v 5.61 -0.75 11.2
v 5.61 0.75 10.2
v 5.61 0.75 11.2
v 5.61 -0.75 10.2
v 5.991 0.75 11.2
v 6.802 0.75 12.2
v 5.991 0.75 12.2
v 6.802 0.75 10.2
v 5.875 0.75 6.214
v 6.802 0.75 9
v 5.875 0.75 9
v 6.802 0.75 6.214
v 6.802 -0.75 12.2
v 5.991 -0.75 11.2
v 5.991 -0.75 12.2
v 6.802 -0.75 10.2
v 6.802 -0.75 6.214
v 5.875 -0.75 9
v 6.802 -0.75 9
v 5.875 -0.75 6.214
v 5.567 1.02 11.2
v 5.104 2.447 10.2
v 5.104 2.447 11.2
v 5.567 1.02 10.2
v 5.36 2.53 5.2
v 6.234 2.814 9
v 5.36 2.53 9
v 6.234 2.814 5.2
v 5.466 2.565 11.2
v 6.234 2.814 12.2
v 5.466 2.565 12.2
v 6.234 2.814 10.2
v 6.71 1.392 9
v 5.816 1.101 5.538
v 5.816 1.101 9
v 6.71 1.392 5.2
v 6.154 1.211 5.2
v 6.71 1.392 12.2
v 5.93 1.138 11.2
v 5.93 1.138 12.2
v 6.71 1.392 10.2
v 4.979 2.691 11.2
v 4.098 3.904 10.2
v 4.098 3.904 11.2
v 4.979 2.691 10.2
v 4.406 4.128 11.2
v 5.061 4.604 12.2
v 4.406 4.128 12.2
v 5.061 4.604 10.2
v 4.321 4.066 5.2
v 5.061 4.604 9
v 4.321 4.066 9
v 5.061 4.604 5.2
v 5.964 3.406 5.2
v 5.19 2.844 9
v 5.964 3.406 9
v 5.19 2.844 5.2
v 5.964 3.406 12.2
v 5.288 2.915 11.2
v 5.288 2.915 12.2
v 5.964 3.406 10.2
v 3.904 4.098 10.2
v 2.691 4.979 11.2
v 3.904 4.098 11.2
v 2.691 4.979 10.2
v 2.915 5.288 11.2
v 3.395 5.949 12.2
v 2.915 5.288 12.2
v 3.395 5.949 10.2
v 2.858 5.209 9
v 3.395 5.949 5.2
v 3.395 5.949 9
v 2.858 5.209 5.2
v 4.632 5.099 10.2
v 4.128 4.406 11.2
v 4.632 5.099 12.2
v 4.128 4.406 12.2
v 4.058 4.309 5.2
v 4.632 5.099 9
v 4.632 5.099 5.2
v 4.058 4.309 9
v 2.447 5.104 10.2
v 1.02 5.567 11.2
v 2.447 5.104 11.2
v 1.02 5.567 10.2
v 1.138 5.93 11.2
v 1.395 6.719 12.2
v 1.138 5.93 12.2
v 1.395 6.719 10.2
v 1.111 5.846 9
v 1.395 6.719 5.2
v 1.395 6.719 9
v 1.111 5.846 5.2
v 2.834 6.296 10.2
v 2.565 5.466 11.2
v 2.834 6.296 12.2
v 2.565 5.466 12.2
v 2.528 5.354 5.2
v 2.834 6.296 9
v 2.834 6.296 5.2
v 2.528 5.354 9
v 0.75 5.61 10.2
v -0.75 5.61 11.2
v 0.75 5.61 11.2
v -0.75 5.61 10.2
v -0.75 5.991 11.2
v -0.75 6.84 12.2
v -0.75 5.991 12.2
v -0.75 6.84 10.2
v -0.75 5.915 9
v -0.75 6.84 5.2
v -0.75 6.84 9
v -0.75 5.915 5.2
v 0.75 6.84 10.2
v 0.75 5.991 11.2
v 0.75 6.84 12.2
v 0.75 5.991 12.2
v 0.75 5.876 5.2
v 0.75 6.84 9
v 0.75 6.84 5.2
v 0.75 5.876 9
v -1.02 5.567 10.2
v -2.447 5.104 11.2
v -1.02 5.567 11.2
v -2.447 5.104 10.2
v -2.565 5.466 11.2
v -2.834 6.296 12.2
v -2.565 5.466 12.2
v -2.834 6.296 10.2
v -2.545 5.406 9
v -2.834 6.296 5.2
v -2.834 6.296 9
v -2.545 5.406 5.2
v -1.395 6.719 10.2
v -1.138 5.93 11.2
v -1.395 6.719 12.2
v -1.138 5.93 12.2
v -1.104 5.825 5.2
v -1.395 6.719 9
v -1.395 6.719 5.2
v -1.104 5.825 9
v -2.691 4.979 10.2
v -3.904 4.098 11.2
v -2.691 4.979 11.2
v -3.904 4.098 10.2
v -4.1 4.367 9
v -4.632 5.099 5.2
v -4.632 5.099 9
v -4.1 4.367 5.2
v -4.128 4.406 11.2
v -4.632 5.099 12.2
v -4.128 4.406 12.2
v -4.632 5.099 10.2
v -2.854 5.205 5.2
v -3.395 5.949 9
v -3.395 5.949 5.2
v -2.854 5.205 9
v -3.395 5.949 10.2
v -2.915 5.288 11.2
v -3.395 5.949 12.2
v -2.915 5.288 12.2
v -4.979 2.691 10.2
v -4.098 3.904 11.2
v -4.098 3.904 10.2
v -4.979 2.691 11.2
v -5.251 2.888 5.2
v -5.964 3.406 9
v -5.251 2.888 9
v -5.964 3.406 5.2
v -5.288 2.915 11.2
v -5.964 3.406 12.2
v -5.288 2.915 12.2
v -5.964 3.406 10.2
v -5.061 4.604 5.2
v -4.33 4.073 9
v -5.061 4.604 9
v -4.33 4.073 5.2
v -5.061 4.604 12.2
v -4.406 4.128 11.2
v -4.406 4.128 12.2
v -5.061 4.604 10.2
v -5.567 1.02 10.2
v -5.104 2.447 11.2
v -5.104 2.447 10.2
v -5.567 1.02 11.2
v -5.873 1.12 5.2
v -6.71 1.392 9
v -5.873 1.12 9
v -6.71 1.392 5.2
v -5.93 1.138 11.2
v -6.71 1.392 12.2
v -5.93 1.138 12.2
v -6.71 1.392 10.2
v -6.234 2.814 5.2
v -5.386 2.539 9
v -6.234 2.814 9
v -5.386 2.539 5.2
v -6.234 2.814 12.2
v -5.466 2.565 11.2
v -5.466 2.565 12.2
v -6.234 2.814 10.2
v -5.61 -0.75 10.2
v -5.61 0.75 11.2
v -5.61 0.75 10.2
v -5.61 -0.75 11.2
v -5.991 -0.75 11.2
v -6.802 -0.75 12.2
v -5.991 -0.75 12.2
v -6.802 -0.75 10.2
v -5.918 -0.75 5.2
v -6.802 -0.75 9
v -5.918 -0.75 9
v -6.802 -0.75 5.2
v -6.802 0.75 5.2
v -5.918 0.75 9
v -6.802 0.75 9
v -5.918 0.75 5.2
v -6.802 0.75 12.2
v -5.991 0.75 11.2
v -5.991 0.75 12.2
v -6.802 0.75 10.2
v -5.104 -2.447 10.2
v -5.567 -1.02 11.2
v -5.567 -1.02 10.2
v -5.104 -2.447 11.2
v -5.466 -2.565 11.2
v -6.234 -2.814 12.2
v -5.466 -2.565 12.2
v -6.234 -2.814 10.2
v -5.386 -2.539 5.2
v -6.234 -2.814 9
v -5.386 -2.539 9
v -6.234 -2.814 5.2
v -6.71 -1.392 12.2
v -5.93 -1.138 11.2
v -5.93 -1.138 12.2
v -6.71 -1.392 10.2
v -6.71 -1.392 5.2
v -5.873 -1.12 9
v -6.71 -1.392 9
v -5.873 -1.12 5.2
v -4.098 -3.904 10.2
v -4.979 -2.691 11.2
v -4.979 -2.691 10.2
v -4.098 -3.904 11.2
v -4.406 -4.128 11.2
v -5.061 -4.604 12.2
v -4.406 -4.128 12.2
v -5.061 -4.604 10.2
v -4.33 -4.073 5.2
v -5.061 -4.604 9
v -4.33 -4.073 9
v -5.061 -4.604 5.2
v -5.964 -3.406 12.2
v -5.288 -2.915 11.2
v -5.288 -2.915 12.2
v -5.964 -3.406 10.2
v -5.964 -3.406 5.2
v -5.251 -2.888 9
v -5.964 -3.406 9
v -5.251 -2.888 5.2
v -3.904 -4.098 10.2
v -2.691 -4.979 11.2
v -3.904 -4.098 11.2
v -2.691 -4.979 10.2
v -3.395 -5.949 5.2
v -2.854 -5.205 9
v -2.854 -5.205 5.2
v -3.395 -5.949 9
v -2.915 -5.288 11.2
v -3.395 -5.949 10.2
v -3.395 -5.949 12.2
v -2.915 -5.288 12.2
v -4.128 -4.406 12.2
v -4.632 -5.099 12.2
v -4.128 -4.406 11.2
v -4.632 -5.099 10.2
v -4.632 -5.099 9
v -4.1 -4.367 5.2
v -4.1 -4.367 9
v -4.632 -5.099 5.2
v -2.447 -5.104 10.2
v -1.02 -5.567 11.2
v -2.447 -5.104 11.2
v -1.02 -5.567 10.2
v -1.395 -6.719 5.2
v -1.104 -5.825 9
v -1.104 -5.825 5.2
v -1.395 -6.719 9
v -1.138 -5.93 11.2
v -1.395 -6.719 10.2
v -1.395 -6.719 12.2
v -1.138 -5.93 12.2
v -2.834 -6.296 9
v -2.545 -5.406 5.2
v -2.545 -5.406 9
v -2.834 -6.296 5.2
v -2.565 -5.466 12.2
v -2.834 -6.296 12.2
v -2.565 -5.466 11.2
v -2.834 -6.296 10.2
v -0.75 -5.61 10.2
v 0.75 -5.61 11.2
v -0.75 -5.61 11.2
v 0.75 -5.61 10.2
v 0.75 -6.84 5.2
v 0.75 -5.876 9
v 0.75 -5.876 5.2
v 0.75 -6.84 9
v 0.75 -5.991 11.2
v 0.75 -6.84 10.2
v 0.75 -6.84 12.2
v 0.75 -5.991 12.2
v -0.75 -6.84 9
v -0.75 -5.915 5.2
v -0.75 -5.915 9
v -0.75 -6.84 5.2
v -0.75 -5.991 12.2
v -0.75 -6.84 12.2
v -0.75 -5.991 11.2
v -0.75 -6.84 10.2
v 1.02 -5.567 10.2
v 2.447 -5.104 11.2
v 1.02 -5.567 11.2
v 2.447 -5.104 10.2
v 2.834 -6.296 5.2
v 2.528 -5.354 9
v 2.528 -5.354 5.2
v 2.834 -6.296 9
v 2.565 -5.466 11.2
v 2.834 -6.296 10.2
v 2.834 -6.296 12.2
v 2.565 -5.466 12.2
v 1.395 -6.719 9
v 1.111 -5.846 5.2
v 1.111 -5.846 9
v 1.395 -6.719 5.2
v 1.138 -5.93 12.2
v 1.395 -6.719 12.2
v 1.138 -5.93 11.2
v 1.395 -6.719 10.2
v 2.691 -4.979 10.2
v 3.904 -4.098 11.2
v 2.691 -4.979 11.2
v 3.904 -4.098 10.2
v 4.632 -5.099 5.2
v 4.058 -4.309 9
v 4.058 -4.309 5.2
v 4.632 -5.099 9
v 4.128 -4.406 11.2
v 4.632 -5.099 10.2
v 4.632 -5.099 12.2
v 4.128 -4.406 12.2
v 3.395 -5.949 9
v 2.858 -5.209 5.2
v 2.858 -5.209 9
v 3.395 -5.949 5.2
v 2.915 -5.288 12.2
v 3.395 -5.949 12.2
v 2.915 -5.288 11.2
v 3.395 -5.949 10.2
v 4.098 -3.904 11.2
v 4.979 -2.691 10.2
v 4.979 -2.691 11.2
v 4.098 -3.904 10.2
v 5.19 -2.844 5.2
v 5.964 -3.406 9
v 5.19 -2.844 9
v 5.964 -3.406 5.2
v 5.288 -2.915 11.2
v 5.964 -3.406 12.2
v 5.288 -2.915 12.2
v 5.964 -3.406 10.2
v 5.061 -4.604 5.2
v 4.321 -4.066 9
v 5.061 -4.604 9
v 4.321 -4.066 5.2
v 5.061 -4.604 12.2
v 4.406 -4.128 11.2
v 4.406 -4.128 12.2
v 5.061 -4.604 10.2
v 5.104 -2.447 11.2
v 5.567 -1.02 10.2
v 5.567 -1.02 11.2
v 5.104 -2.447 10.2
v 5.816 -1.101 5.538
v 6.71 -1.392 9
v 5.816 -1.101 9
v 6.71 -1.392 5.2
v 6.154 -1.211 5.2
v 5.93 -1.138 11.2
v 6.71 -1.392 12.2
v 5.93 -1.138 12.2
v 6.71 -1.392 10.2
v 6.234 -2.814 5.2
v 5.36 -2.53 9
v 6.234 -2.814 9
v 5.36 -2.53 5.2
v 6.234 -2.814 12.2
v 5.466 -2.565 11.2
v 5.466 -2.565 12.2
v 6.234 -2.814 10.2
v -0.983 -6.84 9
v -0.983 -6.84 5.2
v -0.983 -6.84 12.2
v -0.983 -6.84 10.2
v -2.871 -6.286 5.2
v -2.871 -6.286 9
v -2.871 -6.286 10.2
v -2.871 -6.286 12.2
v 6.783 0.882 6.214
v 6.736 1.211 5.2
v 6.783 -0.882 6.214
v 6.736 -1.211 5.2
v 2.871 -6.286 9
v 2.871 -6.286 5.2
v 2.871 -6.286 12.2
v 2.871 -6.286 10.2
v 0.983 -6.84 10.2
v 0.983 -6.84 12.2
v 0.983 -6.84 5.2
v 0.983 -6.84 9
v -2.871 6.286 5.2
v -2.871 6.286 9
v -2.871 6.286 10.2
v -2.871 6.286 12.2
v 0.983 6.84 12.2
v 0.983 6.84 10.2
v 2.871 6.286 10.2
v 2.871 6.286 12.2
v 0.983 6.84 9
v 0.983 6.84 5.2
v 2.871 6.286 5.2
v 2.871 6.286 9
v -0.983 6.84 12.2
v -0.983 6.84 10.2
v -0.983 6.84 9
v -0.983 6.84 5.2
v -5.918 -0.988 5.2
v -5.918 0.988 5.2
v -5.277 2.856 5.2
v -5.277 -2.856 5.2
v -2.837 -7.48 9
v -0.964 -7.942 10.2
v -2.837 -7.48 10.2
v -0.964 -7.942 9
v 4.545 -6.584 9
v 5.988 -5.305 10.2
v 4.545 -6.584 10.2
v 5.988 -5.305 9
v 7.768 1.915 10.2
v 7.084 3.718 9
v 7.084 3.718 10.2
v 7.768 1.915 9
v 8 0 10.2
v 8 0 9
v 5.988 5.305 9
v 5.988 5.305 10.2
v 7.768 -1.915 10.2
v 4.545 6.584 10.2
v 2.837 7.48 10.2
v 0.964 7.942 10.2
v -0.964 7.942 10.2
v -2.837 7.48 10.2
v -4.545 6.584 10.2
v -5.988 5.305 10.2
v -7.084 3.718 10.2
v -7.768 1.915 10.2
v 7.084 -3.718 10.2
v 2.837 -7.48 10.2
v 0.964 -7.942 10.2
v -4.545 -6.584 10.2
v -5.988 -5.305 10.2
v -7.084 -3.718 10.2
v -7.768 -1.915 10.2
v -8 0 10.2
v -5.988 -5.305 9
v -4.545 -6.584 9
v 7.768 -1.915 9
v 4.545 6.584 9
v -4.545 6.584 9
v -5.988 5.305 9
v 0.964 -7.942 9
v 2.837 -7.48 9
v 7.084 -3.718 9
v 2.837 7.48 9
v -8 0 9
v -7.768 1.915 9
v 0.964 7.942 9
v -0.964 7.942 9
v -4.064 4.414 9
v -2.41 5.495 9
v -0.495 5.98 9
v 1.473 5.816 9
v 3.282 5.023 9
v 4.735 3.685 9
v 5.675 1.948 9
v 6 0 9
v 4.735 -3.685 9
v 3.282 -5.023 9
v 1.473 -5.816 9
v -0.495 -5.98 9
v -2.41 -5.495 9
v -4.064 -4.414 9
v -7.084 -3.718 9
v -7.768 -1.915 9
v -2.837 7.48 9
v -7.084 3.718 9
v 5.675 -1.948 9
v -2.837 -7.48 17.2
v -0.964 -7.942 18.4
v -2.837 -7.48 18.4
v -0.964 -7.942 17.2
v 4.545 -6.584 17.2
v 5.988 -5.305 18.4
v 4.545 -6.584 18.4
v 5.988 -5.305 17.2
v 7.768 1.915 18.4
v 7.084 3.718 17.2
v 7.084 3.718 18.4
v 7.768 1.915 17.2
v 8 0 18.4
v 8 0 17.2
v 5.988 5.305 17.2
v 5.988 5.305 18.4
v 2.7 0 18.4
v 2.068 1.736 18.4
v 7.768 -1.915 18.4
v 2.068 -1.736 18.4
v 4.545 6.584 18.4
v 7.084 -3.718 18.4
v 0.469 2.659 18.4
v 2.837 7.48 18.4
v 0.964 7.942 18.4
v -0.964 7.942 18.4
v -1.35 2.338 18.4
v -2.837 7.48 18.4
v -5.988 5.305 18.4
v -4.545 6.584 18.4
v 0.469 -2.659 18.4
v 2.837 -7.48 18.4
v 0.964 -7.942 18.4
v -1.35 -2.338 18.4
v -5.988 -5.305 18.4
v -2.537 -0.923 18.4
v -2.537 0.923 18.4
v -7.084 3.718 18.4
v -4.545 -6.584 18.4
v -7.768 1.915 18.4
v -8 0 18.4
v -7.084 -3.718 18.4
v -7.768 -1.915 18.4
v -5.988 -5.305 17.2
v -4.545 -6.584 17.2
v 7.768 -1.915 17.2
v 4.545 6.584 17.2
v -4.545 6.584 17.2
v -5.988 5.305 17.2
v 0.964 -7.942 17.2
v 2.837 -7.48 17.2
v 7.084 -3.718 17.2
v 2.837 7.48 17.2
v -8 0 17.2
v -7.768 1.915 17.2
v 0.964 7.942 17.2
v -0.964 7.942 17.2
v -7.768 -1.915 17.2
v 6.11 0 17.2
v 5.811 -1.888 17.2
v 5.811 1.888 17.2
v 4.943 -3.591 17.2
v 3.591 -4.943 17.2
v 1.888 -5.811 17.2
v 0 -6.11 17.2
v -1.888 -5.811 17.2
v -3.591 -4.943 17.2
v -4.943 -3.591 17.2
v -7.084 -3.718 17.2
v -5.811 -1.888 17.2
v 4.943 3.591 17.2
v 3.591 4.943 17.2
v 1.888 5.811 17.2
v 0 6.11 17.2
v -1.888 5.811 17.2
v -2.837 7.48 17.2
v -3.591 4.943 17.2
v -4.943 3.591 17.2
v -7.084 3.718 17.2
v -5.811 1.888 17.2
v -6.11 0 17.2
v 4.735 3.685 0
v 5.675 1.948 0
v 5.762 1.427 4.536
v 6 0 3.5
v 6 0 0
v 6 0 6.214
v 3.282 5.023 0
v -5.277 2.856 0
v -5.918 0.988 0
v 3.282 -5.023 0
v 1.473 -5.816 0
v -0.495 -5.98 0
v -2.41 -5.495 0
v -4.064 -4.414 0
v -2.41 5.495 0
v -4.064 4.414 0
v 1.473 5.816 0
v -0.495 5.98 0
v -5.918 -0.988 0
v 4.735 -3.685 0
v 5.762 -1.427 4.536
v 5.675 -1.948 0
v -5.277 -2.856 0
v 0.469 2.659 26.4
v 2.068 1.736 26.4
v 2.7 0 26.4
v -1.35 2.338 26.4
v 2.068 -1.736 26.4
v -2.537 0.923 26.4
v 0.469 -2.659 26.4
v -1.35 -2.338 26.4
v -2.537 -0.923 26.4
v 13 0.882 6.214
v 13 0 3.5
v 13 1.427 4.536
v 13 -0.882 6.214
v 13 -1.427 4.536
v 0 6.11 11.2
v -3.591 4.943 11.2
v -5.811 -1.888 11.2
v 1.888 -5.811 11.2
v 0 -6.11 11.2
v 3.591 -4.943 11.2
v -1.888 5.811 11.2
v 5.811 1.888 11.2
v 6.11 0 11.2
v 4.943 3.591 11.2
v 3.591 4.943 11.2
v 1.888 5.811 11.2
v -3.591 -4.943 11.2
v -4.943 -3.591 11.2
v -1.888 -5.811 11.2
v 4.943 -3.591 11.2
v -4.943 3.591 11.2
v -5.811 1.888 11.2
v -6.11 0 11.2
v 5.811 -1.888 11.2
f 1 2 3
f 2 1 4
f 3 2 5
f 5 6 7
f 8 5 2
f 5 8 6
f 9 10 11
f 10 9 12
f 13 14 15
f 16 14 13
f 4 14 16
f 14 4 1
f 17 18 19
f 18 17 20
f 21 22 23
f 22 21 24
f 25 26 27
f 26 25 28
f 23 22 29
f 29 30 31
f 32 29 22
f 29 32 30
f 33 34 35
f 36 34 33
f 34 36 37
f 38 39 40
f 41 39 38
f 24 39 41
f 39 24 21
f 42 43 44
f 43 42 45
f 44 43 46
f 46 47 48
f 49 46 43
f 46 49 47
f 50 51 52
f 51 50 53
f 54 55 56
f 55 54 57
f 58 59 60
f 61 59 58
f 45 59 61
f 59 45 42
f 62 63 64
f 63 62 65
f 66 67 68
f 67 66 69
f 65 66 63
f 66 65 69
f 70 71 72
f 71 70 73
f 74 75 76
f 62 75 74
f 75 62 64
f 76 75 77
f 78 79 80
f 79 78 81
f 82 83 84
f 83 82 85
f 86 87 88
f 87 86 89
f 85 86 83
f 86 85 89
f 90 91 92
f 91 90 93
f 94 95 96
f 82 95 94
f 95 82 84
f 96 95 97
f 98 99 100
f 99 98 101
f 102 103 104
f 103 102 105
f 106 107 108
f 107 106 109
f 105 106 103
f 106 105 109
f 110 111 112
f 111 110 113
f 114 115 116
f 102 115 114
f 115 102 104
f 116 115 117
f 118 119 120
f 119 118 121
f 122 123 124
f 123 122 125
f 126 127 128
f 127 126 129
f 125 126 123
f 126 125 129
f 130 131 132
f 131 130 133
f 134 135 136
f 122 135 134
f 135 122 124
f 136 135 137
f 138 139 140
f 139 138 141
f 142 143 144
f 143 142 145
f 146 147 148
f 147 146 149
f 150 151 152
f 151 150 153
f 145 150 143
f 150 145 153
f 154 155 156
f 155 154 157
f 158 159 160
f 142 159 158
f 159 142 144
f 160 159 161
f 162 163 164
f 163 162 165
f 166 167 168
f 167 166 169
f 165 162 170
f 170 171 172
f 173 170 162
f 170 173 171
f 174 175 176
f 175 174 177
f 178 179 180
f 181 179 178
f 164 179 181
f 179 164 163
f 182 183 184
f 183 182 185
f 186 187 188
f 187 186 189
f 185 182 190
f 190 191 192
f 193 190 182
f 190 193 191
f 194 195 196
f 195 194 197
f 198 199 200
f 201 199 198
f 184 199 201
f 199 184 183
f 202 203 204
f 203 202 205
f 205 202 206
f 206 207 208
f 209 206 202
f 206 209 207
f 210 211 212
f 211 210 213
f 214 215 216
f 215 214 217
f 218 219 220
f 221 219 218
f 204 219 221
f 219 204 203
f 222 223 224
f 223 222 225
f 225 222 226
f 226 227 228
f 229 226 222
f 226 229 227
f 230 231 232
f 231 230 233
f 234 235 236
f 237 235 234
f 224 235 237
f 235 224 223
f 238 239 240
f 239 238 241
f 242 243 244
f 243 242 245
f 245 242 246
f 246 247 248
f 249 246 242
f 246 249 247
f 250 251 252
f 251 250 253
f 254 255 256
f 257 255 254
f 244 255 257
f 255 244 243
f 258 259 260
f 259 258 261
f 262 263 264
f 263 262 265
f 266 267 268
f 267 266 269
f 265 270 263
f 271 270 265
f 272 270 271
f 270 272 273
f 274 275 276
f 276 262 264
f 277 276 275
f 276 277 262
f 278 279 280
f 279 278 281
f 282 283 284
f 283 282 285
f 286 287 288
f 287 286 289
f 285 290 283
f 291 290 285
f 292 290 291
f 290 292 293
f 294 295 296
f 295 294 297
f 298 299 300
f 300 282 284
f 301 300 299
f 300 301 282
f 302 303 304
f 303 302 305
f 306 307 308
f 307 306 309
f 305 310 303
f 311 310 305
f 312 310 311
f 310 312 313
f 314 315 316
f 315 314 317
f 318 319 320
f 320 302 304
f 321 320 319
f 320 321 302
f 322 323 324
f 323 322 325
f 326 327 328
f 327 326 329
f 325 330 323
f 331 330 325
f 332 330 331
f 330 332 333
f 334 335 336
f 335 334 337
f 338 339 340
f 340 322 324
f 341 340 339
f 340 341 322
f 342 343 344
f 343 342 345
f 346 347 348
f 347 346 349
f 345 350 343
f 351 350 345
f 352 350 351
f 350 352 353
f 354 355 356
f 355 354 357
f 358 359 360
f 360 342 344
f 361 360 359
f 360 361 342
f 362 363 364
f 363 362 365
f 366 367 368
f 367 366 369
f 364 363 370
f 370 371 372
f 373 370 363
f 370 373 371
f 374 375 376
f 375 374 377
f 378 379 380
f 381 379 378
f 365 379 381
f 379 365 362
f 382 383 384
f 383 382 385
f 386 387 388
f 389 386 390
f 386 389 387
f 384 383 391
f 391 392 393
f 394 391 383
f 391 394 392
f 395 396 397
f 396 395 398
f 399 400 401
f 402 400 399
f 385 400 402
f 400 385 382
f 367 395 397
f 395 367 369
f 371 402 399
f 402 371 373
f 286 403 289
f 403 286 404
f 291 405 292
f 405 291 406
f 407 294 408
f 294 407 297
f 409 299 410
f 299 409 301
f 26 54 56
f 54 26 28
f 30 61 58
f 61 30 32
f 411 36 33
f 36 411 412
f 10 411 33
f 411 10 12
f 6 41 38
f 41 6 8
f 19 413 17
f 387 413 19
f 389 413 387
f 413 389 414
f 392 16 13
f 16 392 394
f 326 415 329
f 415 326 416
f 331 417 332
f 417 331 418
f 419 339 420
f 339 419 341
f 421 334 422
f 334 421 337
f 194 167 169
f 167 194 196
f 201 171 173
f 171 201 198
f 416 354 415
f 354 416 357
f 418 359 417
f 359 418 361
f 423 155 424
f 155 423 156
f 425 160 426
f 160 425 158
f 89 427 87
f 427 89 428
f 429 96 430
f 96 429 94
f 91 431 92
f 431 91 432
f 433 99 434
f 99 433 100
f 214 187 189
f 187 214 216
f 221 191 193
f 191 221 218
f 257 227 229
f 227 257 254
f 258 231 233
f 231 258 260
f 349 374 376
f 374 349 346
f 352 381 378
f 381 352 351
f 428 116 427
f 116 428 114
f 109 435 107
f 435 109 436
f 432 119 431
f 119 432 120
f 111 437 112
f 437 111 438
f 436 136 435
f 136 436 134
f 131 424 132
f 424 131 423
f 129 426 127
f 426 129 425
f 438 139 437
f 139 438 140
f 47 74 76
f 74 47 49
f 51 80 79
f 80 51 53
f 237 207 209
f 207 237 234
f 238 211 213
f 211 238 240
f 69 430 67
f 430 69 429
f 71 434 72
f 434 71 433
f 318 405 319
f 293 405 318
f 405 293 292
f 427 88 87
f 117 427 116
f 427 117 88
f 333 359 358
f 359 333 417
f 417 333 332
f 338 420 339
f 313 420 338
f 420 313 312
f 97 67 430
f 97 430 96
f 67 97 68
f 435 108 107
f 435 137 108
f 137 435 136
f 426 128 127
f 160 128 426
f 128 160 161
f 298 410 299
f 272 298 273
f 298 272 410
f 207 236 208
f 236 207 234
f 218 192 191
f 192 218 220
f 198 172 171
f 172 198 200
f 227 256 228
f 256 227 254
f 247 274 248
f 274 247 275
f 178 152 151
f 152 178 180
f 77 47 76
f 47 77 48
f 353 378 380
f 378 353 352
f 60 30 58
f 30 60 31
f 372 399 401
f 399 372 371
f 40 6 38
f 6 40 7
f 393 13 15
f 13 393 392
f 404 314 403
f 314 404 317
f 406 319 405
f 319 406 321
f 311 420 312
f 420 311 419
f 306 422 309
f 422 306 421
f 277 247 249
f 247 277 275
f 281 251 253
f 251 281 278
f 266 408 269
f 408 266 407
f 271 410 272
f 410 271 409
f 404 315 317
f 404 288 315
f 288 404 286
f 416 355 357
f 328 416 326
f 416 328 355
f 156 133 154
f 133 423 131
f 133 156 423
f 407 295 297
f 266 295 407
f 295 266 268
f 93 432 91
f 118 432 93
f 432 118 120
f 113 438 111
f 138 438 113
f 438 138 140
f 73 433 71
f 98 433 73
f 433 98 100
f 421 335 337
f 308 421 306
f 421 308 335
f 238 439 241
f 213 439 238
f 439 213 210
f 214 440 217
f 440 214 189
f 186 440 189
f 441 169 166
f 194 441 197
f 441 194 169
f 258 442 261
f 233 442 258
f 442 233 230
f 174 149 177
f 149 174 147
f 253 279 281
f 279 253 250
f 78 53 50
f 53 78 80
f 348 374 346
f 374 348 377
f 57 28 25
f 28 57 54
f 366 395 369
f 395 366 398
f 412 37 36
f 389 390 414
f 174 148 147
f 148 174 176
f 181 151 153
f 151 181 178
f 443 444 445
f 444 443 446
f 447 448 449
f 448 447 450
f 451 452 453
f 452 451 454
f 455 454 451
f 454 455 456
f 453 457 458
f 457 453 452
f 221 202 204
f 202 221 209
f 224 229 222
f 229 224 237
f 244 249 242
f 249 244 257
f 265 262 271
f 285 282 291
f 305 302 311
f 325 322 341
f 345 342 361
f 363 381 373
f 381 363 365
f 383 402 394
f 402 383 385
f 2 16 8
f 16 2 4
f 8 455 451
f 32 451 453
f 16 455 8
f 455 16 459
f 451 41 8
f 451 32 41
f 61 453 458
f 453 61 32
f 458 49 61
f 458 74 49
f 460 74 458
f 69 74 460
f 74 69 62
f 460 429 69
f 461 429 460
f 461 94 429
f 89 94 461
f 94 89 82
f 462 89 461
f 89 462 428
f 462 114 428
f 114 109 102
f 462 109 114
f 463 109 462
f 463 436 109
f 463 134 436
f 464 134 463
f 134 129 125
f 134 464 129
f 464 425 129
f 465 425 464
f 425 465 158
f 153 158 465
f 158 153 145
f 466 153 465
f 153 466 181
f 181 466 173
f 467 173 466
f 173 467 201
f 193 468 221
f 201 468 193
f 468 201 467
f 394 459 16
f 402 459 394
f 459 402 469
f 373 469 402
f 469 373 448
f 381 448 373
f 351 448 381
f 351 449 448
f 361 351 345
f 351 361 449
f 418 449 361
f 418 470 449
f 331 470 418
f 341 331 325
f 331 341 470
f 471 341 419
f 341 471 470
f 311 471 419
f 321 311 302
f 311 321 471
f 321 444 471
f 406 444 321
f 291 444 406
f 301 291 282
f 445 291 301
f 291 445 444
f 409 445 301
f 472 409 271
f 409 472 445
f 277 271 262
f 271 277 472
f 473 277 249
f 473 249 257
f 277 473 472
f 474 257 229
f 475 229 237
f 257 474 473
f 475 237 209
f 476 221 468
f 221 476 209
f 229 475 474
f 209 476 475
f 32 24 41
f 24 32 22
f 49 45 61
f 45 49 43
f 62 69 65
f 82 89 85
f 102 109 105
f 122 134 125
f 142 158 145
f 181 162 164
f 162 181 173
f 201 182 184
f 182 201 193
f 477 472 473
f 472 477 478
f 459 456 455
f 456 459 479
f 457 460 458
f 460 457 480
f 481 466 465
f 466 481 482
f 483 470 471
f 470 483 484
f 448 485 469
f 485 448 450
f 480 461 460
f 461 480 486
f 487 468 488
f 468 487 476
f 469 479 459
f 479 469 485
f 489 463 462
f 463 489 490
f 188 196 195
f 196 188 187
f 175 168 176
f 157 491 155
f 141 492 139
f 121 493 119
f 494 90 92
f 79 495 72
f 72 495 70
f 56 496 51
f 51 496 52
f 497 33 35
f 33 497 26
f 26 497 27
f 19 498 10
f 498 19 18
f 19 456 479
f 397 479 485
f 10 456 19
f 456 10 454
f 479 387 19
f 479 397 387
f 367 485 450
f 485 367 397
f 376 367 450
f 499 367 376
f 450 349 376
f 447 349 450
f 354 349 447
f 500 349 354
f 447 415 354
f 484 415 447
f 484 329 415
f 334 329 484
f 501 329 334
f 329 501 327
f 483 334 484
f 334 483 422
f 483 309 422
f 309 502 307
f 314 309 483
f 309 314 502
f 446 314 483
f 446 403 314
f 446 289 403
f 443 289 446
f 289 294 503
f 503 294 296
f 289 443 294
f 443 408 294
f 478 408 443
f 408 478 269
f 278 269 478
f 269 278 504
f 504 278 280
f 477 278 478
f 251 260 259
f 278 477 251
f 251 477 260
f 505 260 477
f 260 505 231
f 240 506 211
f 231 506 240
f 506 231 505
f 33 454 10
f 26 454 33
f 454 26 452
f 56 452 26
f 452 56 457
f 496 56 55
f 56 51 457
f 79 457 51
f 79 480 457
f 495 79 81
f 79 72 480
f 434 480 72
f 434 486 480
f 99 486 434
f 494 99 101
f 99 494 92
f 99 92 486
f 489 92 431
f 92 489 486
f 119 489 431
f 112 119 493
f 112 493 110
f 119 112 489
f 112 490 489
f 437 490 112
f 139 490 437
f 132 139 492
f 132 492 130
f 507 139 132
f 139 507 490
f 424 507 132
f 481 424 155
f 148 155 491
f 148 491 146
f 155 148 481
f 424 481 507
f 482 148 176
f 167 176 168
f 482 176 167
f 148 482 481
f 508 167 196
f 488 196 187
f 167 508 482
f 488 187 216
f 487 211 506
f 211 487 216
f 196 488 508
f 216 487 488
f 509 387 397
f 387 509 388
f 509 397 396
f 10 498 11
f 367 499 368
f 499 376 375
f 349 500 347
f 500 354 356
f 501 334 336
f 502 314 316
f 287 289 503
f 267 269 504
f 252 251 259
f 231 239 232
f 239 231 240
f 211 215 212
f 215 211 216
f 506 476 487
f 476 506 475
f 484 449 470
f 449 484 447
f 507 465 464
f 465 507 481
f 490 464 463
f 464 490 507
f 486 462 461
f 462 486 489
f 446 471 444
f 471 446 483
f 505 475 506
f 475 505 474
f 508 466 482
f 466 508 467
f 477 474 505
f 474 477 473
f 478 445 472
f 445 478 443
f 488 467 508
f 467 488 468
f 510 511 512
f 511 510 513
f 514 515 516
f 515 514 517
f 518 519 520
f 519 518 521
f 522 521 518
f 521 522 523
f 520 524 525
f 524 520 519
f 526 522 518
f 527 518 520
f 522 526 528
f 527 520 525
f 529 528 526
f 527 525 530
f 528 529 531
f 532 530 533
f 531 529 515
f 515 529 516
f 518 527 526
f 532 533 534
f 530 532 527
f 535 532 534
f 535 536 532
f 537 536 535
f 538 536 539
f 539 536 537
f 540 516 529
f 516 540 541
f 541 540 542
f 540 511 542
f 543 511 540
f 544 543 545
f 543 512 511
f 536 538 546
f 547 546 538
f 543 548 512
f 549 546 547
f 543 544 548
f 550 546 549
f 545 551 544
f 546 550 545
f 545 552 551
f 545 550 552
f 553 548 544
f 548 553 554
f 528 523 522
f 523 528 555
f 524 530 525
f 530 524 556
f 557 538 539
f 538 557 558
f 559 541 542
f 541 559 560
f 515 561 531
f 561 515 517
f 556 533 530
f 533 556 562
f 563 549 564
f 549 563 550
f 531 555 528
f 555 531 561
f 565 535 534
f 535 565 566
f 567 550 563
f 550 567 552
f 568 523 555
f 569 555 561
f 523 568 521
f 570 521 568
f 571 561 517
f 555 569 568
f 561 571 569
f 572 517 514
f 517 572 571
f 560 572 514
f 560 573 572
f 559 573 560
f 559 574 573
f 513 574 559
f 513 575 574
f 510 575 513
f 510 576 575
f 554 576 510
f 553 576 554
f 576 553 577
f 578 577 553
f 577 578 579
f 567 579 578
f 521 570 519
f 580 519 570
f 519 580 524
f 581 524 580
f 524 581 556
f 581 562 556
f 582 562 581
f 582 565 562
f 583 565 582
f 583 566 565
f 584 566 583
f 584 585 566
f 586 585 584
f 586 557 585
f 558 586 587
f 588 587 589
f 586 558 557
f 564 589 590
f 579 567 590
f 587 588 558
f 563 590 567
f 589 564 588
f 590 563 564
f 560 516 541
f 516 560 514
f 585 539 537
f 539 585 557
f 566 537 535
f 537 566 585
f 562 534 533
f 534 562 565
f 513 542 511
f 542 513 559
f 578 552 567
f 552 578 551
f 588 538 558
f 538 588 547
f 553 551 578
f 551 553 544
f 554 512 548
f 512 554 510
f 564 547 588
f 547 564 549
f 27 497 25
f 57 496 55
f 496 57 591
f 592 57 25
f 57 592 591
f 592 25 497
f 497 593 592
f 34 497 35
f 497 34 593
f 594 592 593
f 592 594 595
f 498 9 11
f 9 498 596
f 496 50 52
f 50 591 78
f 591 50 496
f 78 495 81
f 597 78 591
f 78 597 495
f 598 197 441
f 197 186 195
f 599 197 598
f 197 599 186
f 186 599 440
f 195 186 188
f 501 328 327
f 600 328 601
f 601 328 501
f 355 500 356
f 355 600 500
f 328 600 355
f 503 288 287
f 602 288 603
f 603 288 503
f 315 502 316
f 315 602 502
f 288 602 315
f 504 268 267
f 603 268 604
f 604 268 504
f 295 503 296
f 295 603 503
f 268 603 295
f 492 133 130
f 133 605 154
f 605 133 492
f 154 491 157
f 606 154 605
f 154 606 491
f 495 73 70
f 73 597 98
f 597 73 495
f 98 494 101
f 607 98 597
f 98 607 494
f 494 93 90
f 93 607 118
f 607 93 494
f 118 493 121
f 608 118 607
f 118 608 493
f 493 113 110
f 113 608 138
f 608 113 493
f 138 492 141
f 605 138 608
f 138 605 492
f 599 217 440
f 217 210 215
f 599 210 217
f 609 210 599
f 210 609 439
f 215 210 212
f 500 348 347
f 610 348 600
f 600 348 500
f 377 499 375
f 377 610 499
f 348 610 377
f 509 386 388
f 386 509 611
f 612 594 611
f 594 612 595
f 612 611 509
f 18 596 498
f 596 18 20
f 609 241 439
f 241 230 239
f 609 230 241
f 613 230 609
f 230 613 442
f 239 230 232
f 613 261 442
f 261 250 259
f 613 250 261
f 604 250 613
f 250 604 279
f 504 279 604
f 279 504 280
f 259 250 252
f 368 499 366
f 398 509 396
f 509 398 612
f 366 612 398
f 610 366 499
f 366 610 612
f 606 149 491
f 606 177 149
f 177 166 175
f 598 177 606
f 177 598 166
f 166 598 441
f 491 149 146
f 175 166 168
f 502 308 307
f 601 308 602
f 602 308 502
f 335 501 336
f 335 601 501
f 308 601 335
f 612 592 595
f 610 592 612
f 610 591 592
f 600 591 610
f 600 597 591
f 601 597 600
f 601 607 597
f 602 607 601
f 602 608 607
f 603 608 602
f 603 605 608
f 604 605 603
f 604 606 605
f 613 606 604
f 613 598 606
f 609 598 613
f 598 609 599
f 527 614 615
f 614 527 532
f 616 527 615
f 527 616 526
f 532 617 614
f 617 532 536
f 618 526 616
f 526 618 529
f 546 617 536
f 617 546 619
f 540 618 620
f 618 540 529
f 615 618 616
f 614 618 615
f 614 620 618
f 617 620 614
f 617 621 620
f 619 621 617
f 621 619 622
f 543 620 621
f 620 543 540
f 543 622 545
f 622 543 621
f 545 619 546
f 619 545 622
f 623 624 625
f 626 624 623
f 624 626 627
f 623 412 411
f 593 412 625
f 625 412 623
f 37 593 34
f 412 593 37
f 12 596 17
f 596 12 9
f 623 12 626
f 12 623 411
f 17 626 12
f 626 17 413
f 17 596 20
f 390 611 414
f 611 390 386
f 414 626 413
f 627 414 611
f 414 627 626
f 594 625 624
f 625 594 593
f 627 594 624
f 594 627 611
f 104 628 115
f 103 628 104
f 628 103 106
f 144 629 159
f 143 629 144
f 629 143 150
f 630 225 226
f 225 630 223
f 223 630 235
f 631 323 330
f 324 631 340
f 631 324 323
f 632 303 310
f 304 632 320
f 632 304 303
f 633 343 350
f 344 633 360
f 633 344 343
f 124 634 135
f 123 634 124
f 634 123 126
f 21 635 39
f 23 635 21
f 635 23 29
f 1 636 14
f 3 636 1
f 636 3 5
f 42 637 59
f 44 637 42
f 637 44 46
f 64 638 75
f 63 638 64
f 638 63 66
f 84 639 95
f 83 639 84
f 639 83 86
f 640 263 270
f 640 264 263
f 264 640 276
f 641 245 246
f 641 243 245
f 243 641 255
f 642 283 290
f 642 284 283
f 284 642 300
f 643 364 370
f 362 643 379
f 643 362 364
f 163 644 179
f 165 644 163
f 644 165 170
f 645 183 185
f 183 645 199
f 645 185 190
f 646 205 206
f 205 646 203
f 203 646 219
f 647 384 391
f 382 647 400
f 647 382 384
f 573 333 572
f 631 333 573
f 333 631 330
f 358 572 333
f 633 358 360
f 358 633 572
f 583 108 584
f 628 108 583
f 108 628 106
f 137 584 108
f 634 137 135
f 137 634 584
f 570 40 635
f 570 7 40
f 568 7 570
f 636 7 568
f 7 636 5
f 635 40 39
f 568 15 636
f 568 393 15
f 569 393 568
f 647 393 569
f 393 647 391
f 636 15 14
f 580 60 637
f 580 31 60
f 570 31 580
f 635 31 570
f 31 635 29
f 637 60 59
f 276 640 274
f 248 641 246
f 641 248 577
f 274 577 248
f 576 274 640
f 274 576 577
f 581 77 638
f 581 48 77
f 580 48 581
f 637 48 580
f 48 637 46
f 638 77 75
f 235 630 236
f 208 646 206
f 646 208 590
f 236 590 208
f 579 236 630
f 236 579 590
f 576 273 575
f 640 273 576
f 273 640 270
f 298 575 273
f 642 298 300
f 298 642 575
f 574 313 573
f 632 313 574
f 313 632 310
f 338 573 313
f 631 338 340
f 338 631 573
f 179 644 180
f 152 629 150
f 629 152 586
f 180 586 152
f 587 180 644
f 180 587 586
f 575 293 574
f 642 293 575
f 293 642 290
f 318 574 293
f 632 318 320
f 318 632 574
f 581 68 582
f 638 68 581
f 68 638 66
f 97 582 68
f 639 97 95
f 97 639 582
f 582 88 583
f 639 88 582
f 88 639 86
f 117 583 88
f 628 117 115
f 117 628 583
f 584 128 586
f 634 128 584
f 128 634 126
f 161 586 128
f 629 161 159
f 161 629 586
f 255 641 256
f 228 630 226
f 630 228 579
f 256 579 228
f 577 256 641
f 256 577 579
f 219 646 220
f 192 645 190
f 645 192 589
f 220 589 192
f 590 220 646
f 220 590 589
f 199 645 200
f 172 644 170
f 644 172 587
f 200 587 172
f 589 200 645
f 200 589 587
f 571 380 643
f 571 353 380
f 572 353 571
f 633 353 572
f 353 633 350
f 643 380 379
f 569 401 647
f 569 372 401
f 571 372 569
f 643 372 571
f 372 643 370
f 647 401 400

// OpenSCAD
// Parameters
tooth_count = 20; //[10:60:1]
pitch_diameter_mm = 12.22; //[6.11:24.44:0.01]
pitch_radius_mm = 6.11; //[3.055:12.22:0.01]
belt_pitch_mm = 2; //[1:10:0.01]
tooth_depth_mm = 0.8; //[0.4:1.6:0.01]
tooth_width_mm = 1.5; //[0.8:3:0.01]
pulley_width_mm = 7; //[3.5:14:0.1]
bore_diameter_mm = 5; //[2.5:10:0.01]
hub_diameter_mm = 12; //[6:24:0.1]
hub_length_mm = 10; //[5:20:0.1]
flange_enabled = 1; //[0:1:1]
flange_diameter_mm = 16; //[8:32:0.1]
flange_thickness_mm = 1.2; //[0.6:2.4:0.05]
set_screw_count = 1; //[0:2:1]
set_screw_thread_diameter_mm = 3; //[2:5:0.1]
set_screw_z_mm = 5; //[0:20:0.1]
tolerances_mm = 0.2; //[0.05:0.5:0.01]
overlap_mm = 1; //[0.5:2:0.1]

// Pulley - complete geometry
module pulley() {
  color("Silver") {
    // Toothed pulley body
    difference() {
      translate([0, 0, hub_length_mm/2 + flange_thickness_mm*flange_enabled + pulley_width_mm/2 - overlap_mm])
        cylinder(r=pitch_radius_mm + tooth_depth_mm, h=pulley_width_mm, center=true);
      // Tooth notches
      for (i = [0:tooth_count-1]) {
        rotate([0, 0, i*360/tooth_count])
          translate([pitch_radius_mm + tooth_depth_mm/2, 0, hub_length_mm/2 + flange_thickness_mm*flange_enabled + pulley_width_mm/2 - overlap_mm])
            cube([tooth_depth_mm + overlap_mm, tooth_width_mm, pulley_width_mm + 2*overlap_mm], center=true);
      }
    }
    // Hub
    translate([0, 0, hub_length_mm/2])
      cylinder(r=hub_diameter_mm/2, h=hub_length_mm, center=true);
    // Flanges
    if (flange_enabled) {
      translate([0, 0, hub_length_mm + (flange_thickness_mm*flange_enabled)/2 - overlap_mm])
        cylinder(r=flange_diameter_mm/2, h=flange_thickness_mm, center=true);
      translate([0, 0, hub_length_mm + flange_thickness_mm*flange_enabled + pulley_width_mm - overlap_mm + (flange_thickness_mm*flange_enabled)/2])
        cylinder(r=flange_diameter_mm/2, h=flange_thickness_mm, center=true);
    }
    // Bore
    translate([0, 0, hub_length_mm + flange_thickness_mm*flange_enabled + pulley_width_mm/2])
      cylinder(r=(bore_diameter_mm + 2*tolerances_mm)/2, h=hub_length_mm + pulley_width_mm + 2*flange_thickness_mm*flange_enabled + 4*overlap_mm, center=true);
    // Set screw holes
    if (set_screw_count > 0) {
      for (i = [0:set_screw_count-1]) {
        rotate([0, 0, i*90])
          translate([hub_diameter_mm/2 - overlap_mm, 0, set_screw_z_mm])
            rotate([0, 90, 0])
              cylinder(r=set_screw_thread_diameter_mm/2, h=hub_diameter_mm + 4*overlap_mm, center=true);
      }
    }
  }
}

// Printed Pulley Teeth From Profile - detailed geometry
module printed_pulley_teeth_from_profile() {
  color("Gray") {
    // Example geometry for printed pulley teeth from profile
    translate([0, 0, hub_length_mm + flange_thickness_mm*flange_enabled + pulley_width_mm/2])
      cylinder(r=pitch_radius_mm, h=pulley_width_mm, center=true);
  }
}

// Printed Pulley GT2 Teeth - detailed geometry
module printed_pulley_GT2_teeth() {
  color("Gray") {
    // Example geometry for printed GT2 teeth
    translate([0, 0, hub_length_mm + flange_thickness_mm*flange_enabled + pulley_width_mm/2])
      cylinder(r=pitch_radius_mm - tooth_depth_mm, h=pulley_width_mm, center=true);
  }
}

// Printed Pulley Teeth - detailed geometry
module printed_pulley_teeth() {
  color("Gray") {
    // Example geometry for printed pulley teeth
    translate([0, 0, hub_length_mm + flange_thickness_mm*flange_enabled + pulley_width_mm/2])
      cylinder(r=pitch_radius_mm - tooth_depth_mm/2, h=pulley_width_mm, center=true);
  }
}

// Assembly
module assembly() {
  pulley();
  printed_pulley_teeth_from_profile();
  printed_pulley_GT2_teeth();
  printed_pulley_teeth();
}

assembly();
